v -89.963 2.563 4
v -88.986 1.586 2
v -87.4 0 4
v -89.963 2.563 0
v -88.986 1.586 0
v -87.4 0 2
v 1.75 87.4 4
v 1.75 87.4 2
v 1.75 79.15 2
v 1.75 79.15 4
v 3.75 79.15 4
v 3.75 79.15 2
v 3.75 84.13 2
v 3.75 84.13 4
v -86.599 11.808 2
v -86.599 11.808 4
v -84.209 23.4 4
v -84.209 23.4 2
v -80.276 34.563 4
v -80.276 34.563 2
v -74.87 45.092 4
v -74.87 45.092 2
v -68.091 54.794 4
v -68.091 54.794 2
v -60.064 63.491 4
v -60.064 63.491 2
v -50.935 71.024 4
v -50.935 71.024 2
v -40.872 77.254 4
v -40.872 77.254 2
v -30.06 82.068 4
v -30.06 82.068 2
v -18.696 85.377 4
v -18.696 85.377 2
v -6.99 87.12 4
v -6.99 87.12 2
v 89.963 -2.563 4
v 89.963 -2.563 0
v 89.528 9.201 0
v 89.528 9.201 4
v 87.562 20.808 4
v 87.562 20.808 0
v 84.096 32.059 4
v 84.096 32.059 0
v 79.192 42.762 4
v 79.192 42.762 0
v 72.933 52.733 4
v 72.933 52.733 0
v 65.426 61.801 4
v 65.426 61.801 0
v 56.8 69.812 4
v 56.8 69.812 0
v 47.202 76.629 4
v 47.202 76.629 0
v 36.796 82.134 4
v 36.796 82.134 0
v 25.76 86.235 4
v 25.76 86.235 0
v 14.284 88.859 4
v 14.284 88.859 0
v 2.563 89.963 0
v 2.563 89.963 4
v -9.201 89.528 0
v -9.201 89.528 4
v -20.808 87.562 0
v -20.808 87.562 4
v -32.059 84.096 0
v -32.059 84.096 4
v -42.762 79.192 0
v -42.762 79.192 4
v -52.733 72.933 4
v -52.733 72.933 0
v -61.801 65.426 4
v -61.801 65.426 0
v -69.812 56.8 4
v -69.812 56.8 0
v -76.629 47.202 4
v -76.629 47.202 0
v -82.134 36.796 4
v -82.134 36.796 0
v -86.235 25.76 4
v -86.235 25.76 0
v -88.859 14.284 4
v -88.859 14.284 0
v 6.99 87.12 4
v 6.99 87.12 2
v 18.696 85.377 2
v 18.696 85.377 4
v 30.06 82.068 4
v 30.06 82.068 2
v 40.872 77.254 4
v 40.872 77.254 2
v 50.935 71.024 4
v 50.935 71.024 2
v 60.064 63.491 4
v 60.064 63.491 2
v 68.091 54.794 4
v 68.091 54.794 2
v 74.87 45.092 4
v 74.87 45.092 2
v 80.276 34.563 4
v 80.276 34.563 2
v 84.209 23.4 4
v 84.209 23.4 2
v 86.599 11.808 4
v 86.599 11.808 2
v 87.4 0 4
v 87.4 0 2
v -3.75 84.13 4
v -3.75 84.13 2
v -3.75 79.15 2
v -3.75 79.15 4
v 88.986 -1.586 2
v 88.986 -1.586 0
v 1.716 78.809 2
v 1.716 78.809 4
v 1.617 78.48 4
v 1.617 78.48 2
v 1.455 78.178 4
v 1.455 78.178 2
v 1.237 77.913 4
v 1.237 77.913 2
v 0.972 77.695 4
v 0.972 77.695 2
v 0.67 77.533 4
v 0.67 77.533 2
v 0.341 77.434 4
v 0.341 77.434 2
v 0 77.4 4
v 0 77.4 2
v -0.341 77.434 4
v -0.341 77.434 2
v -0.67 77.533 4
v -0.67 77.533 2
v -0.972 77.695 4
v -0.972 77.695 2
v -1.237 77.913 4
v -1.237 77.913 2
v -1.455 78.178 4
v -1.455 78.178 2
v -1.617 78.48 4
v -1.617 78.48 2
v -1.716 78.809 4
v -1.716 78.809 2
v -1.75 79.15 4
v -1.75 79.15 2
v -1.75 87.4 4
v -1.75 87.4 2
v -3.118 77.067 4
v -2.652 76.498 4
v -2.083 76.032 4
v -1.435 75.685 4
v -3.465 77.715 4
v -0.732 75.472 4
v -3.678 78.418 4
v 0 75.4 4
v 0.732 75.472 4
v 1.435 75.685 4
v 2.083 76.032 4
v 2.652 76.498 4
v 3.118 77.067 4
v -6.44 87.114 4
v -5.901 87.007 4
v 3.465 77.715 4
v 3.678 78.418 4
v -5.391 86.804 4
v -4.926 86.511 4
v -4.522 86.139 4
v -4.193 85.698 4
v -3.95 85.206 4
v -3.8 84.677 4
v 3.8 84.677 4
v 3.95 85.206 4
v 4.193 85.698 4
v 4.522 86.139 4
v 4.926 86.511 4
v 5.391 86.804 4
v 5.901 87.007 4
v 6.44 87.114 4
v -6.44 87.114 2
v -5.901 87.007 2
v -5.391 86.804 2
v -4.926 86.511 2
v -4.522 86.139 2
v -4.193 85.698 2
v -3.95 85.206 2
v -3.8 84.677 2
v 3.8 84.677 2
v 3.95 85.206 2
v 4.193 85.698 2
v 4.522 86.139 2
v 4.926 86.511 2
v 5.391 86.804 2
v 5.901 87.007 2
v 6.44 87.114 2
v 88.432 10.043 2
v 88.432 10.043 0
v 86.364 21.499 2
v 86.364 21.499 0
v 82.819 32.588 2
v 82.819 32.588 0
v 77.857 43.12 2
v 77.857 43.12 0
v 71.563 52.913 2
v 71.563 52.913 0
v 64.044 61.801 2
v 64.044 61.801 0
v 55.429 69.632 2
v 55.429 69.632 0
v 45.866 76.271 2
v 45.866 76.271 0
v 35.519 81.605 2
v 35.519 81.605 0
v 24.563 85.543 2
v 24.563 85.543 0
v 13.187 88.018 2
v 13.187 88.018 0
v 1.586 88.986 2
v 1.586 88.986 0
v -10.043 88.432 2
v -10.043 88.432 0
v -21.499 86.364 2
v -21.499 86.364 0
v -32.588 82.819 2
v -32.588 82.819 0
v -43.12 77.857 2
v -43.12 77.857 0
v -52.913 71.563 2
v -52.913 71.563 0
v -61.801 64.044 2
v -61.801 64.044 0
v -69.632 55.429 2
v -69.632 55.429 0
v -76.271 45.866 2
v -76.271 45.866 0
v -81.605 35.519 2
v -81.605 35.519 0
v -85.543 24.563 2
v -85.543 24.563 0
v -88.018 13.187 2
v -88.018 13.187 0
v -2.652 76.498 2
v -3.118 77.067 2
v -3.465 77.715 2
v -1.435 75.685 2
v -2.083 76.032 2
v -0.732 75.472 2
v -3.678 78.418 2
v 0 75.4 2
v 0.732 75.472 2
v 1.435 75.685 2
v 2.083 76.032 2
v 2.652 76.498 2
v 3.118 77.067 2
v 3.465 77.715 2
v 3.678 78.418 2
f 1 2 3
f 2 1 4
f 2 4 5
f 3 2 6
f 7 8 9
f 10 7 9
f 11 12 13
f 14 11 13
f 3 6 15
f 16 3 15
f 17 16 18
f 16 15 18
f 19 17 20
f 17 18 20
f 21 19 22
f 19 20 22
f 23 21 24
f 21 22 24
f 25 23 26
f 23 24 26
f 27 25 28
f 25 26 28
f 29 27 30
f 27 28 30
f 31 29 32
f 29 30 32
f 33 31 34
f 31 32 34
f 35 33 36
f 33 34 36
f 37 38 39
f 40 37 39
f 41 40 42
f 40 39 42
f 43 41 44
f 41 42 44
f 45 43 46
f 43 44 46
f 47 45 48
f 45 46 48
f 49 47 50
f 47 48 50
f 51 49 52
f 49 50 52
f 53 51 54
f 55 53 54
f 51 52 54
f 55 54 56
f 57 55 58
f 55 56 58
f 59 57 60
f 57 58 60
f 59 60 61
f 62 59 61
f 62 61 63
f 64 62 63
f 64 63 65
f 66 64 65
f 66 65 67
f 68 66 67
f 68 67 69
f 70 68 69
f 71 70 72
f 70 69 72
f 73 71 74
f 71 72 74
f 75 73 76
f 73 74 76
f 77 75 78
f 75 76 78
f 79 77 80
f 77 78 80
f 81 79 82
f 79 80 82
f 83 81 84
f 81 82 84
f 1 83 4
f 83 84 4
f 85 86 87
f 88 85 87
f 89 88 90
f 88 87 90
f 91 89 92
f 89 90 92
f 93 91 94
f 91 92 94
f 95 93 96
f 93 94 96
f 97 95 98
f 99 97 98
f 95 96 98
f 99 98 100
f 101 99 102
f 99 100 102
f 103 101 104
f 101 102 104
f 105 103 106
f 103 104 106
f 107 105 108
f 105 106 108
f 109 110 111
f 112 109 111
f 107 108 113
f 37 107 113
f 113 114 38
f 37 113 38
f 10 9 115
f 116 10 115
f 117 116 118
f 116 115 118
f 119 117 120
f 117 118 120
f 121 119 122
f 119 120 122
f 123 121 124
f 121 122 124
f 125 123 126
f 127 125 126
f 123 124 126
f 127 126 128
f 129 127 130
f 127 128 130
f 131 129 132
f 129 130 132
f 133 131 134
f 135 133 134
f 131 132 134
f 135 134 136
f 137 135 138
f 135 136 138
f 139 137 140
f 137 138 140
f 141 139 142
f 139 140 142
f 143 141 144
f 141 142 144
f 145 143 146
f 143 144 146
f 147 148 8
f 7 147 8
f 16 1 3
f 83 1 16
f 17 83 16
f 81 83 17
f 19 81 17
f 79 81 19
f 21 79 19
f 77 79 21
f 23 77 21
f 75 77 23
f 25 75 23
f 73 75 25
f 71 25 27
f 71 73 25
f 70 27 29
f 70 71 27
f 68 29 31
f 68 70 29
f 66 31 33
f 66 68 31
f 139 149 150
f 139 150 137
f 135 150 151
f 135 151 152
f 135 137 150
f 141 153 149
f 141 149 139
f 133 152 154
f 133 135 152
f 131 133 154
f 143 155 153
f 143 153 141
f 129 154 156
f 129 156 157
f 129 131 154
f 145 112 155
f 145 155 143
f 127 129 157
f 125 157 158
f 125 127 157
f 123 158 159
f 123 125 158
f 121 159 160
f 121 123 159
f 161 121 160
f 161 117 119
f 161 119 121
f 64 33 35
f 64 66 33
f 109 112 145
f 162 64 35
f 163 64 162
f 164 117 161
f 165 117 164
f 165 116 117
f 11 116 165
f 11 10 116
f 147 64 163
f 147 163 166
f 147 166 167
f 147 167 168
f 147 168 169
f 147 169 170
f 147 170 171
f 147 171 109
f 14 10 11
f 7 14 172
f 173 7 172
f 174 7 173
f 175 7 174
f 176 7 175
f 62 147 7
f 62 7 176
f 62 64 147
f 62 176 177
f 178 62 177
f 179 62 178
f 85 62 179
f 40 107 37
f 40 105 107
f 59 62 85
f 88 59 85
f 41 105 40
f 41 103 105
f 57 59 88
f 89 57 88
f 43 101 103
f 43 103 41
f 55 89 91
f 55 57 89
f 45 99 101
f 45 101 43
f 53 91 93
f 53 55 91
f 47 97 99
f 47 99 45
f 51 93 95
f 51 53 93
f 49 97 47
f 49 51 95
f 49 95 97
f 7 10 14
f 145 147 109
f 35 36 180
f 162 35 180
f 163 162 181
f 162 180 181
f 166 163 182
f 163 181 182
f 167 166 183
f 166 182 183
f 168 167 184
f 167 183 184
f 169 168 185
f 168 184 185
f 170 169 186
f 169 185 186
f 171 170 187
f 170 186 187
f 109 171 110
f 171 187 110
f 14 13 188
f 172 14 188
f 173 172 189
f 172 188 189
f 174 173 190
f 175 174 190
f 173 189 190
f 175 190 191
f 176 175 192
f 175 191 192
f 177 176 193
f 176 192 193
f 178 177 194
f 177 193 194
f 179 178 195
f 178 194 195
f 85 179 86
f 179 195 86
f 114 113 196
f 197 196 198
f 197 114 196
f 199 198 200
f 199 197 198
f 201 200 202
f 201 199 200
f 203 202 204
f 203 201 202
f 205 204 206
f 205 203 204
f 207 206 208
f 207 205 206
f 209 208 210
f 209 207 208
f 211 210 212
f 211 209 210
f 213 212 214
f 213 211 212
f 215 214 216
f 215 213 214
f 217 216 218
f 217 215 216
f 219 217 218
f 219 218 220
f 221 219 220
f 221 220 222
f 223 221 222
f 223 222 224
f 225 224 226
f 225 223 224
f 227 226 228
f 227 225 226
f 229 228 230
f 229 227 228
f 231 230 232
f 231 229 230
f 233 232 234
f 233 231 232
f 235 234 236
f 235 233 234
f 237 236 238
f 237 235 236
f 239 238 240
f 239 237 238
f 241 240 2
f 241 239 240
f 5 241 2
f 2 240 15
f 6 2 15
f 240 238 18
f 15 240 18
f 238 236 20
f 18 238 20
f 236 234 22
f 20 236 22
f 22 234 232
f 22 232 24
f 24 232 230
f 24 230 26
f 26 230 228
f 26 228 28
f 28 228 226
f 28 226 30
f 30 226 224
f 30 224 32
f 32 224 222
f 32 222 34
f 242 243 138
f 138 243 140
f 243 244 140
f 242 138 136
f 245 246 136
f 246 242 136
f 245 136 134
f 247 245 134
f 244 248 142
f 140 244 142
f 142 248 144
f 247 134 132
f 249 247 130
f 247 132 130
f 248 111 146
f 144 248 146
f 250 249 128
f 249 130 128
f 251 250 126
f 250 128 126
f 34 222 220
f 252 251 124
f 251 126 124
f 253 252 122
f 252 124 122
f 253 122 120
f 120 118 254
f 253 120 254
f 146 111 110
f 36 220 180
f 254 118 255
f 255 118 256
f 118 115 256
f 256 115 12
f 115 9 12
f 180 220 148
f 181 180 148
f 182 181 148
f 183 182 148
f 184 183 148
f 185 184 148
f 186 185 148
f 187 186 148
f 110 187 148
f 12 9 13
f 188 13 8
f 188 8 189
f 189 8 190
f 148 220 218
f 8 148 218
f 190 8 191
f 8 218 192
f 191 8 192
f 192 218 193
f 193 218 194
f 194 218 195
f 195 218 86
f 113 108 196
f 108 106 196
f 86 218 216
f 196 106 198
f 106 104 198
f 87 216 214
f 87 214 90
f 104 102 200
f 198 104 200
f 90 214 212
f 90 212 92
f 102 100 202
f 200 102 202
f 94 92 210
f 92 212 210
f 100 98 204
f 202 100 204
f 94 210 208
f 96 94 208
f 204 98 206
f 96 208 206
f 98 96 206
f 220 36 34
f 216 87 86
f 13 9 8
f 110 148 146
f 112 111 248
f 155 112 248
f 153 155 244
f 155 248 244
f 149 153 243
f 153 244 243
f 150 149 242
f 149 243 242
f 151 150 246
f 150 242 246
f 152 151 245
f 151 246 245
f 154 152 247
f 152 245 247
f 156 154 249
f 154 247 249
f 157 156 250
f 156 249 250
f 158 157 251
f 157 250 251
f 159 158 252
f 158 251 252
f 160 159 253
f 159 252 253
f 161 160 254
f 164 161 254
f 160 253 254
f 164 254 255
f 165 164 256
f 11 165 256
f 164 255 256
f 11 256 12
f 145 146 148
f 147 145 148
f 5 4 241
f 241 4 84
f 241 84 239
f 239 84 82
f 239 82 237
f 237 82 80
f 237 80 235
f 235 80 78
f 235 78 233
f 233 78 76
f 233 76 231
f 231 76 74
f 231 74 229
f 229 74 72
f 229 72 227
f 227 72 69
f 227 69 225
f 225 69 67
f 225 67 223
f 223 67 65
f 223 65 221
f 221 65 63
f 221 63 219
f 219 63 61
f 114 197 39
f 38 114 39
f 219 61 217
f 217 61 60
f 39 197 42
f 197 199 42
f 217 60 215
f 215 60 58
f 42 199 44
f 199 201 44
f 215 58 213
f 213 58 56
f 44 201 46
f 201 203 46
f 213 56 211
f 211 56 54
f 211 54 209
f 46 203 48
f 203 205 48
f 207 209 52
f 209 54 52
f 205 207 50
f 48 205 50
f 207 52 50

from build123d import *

# Parameters (mm, degrees)
F1_DEPTH = 4
F2_R     = 89
F3_DEPTH = 2


with BuildPart() as f1:
    # F0 (on Top) → F1 (new body)
    with BuildSketch(Plane.XY):
        with BuildLine():
            Line((87.4, 0), (89.963485, -2.563485))
            ThreePointArc((89.963485, -2.563485), (2.563485, 89.963485), (-89.963485, 2.563485))
            Line((-89.963485, 2.563485), (-87.4, 0))
            ThreePointArc((-87.4, 0), (-64.224916, 59.278327), (-6.989929, 87.120037))
            ThreePointArc((-6.989929, 87.120037), (-4.715275, 86.334164), (-3.75, 84.129647))
            Line((-3.75, 84.129647), (-3.75, 79.15))
            ThreePointArc((-3.75, 79.15), (0, 75.4), (3.75, 79.15))
            Line((3.75, 79.15), (3.75, 84.129647))
            ThreePointArc((3.75, 84.129647), (4.715275, 86.334164), (6.989929, 87.120037))
            ThreePointArc((6.989929, 87.120037), (64.224916, 59.278327), (87.4, 0))
        make_face()
        with BuildLine():
            ThreePointArc((1.75, 79.15), (0, 77.4), (-1.75, 79.15))
            Line((-1.75, 79.15), (-1.75, 87.4))
            Line((-1.75, 87.4), (1.75, 87.4))
            Line((1.75, 87.4), (1.75, 79.15))
        make_face(mode=Mode.SUBTRACT)
    extrude(amount=F1_DEPTH)

    # F2 (on Top) → F3 (cut)
    with BuildSketch(Plane.XY):
        Circle(F2_R)
    extrude(amount=F3_DEPTH, mode=Mode.SUBTRACT)


solid = f1.part
